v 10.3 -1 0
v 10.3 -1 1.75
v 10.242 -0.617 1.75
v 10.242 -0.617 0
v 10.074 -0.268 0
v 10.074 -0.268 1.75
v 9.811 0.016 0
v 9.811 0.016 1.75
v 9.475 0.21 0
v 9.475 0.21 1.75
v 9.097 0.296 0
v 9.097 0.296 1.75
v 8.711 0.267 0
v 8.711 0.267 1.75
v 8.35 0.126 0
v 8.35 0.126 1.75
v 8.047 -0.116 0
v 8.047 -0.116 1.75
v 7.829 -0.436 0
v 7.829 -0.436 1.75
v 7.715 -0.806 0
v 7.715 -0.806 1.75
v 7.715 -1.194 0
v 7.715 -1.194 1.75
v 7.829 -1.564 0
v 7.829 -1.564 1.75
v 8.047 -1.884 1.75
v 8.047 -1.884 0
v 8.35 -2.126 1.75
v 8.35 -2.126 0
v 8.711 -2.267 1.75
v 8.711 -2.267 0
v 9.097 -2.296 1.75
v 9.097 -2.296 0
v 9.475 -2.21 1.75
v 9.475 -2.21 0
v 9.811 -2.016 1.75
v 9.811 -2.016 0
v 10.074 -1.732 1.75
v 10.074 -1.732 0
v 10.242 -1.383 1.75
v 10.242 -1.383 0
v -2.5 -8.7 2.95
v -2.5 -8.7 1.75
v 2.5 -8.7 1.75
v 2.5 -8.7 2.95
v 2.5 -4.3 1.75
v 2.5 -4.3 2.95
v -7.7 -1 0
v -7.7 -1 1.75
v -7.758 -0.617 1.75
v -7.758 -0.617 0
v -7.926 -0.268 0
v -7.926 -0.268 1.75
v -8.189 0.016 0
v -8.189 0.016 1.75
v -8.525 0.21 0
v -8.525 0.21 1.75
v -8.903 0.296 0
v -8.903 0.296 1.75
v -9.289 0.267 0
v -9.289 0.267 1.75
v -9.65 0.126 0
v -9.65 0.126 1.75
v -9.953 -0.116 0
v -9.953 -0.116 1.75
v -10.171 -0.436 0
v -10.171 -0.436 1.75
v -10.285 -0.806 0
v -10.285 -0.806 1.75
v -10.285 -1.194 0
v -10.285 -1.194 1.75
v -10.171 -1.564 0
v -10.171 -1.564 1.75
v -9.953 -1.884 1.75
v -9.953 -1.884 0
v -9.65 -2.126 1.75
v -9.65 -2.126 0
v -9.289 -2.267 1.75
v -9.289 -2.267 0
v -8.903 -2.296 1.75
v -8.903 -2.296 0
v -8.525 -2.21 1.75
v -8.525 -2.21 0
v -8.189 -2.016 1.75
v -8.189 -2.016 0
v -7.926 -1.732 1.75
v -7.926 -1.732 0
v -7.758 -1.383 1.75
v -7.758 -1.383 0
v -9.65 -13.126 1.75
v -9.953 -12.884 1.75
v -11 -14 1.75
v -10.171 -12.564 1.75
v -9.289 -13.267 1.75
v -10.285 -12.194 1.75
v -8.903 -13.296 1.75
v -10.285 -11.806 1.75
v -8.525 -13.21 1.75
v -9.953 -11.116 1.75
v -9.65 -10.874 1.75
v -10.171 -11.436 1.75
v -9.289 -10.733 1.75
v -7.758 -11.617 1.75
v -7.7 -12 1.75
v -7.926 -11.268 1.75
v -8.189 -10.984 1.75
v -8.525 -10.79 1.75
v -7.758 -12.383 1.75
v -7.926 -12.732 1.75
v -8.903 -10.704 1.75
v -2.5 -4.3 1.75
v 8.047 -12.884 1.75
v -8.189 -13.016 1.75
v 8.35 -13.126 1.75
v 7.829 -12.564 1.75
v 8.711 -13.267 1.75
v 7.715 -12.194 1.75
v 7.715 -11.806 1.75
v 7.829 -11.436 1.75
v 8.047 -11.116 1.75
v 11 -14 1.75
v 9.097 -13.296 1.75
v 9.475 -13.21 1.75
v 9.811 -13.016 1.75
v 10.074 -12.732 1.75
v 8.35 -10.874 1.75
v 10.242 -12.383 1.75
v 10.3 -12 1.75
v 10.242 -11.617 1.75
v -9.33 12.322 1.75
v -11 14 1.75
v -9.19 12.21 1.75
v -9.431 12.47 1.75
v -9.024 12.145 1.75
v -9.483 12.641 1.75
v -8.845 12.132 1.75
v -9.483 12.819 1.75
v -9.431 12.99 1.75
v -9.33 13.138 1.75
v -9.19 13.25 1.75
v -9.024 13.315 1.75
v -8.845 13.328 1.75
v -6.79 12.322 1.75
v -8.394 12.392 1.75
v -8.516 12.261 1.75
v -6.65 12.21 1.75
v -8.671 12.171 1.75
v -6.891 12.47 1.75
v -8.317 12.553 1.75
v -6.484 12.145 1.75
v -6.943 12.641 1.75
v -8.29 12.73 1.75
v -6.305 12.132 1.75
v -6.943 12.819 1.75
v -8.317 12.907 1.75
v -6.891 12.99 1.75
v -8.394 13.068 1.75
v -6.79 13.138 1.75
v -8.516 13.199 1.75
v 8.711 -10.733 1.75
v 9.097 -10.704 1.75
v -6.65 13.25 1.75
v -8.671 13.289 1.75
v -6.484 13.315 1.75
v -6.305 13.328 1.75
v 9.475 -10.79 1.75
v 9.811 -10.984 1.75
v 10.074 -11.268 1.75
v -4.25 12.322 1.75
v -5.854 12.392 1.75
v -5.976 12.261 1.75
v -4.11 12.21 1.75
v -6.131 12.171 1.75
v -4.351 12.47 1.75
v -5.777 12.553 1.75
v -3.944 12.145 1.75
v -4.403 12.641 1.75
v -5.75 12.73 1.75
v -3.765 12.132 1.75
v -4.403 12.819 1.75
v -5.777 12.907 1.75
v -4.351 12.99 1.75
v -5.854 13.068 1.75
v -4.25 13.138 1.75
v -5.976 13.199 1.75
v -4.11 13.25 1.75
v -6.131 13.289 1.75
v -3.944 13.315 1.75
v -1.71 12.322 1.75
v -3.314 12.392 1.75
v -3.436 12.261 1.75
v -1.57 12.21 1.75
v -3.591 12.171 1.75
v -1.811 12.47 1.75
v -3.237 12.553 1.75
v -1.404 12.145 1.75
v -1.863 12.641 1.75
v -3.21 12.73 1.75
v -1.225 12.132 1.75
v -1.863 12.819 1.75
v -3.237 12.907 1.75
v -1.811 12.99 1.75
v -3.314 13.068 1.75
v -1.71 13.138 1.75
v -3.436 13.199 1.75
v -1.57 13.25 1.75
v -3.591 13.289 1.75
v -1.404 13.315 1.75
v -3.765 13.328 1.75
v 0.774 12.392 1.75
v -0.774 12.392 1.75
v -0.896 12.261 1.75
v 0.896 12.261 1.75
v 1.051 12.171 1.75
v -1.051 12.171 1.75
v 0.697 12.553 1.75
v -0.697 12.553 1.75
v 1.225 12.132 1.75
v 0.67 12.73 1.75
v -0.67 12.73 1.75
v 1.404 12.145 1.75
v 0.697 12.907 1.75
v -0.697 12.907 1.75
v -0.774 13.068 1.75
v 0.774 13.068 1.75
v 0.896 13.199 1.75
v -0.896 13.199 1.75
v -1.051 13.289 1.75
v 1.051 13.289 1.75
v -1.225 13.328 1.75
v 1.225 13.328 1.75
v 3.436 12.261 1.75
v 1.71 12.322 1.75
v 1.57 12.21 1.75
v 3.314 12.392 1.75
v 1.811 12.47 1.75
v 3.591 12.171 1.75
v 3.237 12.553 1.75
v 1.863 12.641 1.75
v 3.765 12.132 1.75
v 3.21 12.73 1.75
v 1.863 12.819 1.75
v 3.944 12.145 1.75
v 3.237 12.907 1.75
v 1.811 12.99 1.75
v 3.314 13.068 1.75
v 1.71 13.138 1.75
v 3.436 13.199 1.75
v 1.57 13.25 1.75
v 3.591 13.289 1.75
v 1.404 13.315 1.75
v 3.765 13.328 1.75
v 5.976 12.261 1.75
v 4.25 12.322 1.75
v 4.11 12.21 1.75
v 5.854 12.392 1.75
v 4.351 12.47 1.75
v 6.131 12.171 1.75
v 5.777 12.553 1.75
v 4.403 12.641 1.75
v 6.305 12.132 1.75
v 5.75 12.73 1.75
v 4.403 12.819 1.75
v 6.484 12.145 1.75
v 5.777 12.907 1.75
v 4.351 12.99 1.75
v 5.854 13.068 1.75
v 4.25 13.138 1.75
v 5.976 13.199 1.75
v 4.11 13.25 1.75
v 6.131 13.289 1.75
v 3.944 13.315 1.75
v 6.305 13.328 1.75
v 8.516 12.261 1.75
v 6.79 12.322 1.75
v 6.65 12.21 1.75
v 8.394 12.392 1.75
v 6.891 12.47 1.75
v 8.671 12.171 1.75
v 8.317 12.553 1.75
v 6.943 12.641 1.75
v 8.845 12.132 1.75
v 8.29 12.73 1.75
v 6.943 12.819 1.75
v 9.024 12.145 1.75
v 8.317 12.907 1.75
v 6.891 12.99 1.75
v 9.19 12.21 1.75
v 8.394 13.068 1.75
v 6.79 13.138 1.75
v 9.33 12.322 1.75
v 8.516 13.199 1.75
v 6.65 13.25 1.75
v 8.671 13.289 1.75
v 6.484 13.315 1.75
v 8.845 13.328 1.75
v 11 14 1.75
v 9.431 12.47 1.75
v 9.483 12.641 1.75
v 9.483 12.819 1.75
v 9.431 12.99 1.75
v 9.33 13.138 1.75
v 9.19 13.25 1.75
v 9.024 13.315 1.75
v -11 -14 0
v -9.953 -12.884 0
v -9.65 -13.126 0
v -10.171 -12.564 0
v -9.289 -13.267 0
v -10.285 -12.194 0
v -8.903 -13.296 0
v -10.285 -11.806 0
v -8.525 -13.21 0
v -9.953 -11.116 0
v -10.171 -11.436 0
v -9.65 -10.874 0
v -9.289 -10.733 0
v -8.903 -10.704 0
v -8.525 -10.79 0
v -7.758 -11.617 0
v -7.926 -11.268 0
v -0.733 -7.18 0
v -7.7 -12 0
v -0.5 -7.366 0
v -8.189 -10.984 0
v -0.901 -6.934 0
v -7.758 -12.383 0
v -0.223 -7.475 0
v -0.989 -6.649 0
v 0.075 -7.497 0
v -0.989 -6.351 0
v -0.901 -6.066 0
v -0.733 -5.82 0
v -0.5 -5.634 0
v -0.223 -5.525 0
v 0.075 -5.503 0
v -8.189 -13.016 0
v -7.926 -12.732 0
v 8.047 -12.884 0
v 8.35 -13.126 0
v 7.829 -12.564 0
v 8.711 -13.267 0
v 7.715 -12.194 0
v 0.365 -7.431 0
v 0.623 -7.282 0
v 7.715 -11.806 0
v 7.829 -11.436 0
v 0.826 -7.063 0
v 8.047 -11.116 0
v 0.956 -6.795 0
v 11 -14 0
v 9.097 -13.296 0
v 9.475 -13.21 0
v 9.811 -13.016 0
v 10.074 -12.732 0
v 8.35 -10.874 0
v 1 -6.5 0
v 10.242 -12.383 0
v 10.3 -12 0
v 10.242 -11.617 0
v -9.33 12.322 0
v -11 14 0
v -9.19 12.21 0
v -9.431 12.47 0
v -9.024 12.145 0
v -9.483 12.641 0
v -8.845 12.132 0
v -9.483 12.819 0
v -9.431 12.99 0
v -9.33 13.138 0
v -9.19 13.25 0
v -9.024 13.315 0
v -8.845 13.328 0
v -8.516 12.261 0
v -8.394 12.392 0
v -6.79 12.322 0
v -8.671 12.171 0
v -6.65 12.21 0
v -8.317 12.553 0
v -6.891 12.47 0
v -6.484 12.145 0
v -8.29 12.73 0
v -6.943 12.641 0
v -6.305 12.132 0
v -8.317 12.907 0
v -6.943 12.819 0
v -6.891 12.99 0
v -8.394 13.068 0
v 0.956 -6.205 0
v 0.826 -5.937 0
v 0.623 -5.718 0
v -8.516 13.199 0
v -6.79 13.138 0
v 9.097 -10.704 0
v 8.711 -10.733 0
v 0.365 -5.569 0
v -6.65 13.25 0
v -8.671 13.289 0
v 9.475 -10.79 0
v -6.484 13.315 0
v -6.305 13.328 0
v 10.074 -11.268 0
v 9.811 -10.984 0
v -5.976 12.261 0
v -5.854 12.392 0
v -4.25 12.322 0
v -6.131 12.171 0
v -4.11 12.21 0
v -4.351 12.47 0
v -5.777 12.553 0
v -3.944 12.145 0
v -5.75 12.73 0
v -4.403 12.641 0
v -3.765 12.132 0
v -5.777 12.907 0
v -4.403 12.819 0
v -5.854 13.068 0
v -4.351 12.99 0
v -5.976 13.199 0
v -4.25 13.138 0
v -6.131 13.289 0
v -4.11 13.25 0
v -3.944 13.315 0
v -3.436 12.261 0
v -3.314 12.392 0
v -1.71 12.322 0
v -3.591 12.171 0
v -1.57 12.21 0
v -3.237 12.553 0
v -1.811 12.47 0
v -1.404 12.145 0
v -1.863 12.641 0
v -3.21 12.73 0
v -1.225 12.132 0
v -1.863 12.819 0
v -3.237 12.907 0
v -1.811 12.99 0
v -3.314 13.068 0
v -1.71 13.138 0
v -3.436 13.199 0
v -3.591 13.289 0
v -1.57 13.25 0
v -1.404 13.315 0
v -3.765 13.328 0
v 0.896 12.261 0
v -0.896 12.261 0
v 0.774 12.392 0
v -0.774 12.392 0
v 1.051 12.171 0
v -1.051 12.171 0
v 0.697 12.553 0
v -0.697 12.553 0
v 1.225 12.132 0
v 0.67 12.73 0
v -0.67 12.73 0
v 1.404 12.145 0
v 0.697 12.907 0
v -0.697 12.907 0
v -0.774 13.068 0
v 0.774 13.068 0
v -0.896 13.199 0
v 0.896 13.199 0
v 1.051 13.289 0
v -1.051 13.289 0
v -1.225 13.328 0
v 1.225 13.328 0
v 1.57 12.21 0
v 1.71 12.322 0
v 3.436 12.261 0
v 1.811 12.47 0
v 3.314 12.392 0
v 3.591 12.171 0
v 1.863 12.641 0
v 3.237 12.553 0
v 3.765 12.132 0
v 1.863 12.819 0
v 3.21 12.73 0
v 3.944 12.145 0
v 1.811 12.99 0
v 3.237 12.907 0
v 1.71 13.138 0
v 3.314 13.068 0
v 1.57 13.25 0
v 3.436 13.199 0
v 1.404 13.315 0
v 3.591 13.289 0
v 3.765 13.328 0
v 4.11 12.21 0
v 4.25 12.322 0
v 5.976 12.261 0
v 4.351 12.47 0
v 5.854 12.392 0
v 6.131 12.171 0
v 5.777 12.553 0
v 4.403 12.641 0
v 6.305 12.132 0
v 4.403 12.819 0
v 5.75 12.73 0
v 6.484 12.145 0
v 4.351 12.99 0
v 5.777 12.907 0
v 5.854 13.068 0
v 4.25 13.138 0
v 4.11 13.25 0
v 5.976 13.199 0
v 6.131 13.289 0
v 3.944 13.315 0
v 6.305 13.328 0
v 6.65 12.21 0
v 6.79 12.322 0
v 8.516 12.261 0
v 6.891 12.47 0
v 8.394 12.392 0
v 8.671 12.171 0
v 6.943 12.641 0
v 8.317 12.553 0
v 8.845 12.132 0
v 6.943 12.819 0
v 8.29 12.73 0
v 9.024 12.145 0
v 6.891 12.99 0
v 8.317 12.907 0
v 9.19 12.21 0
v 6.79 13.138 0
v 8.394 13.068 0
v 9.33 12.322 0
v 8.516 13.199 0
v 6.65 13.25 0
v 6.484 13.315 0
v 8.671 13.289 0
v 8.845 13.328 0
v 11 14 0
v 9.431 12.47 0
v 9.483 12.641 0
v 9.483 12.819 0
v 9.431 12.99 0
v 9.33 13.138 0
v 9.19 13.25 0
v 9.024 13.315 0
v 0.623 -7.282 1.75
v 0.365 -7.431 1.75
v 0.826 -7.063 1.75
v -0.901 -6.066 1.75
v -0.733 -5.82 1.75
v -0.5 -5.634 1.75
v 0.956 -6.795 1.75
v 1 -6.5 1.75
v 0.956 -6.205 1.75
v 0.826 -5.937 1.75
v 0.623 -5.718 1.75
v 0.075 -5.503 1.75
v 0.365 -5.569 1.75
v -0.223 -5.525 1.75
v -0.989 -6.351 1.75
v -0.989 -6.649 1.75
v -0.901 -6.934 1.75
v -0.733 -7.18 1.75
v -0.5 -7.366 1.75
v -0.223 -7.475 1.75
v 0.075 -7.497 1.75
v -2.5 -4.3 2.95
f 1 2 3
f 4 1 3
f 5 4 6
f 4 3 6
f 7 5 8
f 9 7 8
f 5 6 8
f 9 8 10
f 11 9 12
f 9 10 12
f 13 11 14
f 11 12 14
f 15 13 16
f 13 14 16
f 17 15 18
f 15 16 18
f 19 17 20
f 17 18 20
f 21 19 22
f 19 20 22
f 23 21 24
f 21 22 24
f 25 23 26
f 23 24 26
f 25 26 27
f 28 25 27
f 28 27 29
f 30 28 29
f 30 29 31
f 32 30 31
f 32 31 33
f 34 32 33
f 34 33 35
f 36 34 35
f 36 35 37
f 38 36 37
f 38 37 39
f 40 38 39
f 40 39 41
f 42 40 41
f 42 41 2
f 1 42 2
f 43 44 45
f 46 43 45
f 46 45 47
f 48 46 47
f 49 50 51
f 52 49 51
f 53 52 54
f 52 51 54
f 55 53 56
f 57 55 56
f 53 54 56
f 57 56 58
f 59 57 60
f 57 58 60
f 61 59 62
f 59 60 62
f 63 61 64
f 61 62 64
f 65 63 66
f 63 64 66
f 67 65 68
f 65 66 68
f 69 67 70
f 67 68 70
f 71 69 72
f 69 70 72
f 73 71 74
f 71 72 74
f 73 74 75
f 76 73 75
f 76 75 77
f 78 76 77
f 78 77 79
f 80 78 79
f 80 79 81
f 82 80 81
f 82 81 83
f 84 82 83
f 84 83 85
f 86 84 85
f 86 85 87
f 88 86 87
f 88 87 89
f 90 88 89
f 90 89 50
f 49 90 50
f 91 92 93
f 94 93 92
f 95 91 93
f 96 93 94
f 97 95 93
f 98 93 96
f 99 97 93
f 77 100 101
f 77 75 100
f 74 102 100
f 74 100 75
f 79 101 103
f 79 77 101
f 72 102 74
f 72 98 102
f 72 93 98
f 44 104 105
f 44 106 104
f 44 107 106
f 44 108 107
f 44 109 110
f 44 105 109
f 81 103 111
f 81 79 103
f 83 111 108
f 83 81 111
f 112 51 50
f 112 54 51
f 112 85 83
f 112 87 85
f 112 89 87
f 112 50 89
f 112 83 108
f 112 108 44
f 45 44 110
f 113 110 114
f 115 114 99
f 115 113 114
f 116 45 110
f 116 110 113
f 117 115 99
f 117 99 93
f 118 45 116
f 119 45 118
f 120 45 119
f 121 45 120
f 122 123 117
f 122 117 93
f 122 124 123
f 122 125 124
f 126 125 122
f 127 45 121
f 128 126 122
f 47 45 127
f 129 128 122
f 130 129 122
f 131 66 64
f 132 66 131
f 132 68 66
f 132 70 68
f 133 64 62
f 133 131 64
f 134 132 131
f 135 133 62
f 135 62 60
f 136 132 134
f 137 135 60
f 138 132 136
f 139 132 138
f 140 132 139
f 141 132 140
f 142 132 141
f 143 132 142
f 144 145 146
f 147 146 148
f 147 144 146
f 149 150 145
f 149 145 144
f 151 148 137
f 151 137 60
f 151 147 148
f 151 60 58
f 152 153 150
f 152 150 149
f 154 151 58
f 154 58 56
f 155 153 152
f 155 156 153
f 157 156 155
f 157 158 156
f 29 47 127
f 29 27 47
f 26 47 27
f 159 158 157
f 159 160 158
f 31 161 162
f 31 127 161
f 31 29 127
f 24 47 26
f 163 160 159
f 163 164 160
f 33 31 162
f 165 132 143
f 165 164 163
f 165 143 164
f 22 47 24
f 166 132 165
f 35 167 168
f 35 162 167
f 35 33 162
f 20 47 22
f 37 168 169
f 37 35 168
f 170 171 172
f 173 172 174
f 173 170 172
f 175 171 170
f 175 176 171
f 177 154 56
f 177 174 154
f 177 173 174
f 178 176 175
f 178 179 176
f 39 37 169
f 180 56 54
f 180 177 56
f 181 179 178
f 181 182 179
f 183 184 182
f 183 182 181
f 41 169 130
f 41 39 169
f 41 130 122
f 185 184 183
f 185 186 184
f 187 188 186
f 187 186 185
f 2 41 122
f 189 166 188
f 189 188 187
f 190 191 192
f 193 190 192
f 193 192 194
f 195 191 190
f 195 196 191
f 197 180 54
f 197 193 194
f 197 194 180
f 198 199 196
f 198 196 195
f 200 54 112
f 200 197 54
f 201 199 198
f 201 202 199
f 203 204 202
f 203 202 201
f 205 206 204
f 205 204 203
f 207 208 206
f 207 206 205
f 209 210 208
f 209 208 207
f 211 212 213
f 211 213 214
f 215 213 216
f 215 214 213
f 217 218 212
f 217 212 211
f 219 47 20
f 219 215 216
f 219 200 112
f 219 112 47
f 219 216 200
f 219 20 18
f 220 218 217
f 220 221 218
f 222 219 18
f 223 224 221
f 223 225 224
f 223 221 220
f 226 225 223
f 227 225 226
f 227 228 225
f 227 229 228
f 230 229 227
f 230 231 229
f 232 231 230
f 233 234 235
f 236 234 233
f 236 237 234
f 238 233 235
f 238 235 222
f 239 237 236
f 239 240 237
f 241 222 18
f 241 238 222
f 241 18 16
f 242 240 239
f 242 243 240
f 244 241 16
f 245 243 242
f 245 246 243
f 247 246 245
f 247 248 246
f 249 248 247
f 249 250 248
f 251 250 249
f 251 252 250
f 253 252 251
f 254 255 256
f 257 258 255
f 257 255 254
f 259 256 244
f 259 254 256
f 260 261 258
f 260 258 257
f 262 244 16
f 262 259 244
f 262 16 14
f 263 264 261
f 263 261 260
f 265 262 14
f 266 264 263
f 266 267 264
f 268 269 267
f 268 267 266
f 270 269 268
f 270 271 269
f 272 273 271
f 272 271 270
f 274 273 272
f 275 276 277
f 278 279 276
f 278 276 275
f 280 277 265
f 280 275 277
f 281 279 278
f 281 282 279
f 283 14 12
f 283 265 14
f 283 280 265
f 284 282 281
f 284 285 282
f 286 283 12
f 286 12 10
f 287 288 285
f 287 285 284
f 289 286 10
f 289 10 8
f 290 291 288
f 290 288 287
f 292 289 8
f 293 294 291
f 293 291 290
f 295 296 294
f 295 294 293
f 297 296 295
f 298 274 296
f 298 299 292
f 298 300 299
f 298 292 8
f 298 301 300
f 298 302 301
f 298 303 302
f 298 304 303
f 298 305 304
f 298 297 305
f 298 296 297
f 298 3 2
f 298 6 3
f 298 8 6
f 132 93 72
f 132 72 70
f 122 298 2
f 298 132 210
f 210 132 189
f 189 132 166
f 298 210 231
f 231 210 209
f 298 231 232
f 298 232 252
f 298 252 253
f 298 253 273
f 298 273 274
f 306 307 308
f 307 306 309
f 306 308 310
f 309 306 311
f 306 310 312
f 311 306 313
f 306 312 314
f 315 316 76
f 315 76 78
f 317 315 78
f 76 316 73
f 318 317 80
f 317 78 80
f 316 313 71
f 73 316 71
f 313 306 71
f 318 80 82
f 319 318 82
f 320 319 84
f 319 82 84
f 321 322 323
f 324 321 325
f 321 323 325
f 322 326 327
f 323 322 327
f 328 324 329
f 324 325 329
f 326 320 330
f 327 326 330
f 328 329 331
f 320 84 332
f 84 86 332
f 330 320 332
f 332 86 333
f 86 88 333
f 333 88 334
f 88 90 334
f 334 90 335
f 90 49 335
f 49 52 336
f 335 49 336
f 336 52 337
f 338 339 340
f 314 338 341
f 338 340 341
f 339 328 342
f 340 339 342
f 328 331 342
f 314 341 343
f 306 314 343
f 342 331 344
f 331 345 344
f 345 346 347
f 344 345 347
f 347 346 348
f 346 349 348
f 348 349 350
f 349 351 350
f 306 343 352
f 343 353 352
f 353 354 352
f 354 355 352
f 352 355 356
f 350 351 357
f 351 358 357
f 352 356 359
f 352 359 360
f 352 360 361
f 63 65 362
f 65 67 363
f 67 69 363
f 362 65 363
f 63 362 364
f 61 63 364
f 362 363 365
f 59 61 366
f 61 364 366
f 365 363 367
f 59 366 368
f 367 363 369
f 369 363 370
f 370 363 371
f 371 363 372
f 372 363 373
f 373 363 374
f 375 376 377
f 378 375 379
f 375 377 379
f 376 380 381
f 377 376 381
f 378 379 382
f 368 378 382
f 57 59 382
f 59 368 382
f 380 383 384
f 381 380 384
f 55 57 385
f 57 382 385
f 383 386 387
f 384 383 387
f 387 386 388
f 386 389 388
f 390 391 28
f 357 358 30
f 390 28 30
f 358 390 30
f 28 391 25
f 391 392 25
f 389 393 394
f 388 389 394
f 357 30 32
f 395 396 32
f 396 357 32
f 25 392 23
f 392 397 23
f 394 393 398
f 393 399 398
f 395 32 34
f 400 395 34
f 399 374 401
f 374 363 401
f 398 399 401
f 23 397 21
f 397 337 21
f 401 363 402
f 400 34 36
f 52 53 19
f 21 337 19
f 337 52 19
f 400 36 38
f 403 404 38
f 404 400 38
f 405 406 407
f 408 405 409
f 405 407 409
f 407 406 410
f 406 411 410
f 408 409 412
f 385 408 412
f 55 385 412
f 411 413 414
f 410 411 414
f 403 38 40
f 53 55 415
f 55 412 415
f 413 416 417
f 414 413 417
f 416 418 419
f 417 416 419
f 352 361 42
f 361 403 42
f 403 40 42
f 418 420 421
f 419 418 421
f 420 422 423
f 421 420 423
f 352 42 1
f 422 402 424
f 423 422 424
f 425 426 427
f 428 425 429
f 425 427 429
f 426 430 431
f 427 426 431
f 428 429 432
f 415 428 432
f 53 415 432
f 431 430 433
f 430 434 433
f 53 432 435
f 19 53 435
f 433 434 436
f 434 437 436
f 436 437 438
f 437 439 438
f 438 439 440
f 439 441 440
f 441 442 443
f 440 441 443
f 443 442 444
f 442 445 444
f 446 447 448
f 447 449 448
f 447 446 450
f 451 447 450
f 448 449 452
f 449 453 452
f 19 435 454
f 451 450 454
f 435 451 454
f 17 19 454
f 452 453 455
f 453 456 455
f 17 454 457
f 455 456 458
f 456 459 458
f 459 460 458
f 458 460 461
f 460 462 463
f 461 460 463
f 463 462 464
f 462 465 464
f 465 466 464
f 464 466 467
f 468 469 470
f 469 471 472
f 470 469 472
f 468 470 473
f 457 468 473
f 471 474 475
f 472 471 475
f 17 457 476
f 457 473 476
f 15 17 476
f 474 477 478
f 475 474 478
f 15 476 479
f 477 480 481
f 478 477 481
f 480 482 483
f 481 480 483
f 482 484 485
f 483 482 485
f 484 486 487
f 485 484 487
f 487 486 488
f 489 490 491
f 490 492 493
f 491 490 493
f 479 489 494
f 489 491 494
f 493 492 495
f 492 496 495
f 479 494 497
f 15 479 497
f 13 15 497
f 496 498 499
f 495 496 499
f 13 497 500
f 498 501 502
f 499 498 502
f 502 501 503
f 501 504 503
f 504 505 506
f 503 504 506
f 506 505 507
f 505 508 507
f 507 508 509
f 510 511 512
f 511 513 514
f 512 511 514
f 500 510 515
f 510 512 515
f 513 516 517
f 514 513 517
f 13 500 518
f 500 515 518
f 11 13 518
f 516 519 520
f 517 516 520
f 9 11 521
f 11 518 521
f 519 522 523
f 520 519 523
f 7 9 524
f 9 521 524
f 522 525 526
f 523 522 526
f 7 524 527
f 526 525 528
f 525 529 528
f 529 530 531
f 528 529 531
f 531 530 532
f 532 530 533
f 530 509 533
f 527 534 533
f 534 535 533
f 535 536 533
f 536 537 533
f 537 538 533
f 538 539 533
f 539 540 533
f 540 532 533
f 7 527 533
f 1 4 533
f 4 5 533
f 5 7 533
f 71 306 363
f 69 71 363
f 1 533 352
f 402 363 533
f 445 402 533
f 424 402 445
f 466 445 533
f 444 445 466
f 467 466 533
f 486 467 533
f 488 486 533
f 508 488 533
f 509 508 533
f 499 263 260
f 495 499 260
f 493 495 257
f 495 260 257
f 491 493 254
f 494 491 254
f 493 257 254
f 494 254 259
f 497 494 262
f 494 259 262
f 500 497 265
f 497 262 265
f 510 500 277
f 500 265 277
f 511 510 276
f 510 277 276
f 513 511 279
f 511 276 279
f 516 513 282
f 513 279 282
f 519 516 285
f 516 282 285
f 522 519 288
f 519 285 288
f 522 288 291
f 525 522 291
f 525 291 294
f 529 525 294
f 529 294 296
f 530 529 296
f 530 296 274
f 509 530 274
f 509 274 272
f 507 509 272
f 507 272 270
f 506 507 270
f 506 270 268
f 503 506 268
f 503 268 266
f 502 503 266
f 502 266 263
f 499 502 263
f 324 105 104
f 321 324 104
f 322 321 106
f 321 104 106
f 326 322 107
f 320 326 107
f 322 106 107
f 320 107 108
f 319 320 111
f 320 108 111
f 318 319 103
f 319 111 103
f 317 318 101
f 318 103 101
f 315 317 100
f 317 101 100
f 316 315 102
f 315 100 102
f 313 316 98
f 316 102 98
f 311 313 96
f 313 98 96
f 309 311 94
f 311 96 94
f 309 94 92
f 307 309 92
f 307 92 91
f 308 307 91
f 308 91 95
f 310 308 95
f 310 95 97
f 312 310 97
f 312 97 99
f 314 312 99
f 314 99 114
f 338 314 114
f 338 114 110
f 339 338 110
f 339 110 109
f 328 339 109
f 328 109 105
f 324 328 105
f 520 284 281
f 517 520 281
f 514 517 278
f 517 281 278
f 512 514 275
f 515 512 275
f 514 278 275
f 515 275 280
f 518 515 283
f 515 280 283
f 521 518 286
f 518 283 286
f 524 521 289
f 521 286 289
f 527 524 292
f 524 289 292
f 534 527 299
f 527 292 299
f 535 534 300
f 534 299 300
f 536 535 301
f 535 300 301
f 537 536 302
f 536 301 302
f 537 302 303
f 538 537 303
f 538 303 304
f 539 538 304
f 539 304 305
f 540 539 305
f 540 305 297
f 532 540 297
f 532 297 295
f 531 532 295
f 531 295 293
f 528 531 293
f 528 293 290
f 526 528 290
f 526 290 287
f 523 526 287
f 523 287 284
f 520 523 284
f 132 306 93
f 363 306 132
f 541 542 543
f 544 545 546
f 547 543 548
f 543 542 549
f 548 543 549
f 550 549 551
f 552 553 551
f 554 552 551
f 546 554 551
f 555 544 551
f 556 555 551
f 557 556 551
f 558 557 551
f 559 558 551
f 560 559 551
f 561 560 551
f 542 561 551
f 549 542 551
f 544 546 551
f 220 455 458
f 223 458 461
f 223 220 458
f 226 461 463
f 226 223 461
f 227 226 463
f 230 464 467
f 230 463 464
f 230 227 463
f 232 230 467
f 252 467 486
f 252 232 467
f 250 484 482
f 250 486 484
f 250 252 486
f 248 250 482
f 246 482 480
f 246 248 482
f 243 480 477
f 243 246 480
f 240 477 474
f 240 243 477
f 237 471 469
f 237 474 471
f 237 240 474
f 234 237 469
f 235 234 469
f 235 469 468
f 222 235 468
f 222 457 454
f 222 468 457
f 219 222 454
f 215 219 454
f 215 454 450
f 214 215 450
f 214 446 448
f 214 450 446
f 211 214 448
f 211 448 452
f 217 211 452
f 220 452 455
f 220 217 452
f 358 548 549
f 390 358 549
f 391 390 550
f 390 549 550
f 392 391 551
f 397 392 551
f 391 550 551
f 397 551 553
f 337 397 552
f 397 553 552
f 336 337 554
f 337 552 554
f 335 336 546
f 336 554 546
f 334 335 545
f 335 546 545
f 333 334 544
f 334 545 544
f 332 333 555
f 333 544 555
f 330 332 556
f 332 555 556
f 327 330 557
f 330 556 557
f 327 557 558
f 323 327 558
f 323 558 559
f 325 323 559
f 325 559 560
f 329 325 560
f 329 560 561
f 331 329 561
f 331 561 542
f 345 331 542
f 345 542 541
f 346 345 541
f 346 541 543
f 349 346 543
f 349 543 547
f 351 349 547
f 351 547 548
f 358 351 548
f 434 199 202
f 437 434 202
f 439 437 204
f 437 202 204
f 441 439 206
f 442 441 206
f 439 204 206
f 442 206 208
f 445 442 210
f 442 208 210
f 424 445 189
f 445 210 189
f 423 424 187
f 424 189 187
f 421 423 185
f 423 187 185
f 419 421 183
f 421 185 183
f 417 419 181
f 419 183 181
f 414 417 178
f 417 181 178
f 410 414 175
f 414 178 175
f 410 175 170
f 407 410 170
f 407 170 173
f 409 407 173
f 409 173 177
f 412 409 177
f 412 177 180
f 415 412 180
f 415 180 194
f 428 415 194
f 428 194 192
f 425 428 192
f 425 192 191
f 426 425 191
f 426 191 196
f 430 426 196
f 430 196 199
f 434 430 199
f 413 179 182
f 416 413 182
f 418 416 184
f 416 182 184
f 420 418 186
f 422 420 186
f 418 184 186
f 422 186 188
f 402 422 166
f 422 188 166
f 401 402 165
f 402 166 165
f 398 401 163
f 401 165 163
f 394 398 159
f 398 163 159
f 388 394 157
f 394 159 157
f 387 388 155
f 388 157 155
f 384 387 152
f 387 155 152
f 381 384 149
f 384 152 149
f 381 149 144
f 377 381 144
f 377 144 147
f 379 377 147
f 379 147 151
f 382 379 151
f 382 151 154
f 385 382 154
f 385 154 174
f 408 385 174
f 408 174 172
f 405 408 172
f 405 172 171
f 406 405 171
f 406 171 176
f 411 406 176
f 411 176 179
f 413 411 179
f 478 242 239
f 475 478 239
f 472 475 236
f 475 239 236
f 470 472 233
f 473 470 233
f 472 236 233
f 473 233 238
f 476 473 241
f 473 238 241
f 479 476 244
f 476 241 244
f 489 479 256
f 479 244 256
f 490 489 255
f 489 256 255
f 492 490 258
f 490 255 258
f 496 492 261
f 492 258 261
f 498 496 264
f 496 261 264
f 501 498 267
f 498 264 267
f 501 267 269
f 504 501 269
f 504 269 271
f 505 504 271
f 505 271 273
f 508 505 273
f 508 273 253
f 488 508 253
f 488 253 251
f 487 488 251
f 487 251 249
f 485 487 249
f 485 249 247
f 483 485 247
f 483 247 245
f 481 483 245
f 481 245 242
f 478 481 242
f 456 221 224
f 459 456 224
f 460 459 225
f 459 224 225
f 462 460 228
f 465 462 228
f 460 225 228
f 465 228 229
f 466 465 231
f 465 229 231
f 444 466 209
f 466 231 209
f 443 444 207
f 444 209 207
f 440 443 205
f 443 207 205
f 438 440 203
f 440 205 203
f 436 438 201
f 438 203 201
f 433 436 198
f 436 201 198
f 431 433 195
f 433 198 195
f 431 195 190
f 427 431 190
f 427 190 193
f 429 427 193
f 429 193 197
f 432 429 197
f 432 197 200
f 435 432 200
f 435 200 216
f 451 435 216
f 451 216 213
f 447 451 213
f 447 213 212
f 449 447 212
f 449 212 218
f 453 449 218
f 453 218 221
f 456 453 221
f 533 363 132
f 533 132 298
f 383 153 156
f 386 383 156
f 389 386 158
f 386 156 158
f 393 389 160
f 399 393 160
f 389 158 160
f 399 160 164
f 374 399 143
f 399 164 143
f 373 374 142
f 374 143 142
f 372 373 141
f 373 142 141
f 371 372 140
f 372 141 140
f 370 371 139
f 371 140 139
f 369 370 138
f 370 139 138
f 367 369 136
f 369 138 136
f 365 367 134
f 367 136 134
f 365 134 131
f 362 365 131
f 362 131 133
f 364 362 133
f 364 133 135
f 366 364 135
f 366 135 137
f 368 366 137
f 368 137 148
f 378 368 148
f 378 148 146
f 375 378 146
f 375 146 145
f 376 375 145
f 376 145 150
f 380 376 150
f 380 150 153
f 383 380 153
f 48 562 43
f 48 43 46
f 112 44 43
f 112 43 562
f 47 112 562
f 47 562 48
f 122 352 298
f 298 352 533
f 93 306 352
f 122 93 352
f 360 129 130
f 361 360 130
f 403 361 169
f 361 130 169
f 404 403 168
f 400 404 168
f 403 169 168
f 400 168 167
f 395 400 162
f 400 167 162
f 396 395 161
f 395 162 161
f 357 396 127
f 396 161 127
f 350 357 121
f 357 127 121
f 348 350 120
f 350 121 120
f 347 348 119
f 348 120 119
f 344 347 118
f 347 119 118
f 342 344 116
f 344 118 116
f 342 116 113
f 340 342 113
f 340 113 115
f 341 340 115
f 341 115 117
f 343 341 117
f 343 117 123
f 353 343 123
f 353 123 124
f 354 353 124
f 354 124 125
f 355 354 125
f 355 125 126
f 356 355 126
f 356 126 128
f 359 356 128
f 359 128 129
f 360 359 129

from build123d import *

# Parameters (mm, degrees)
SKETCH1_W               = 22
SKETCH1_H               = 28
BOSS_EXTRUDE1_DEPTH     = 1.75
SKETCH2_R               = 1.3
SKETCH2_R_2             = 1
CUT_EXTRUDE1_DEPTH      = 18.890290663
SKETCH3_R               = 0.6
CUT_EXTRUDE2_DEPTH      = 18.890290663
LPATTERN1_COUNT         = 4
LPATTERN1_PITCH         = 2.54
MIRROR1_COPY_1_SKETCH_R = 0.6
MIRROR1_COPY_1_DEPTH    = 18.890290663
MIRROR1_COPY_2_SKETCH_R = 0.6
MIRROR1_COPY_2_DEPTH    = 18.890290663
MIRROR1_COPY_3_SKETCH_R = 0.6
MIRROR1_COPY_3_DEPTH    = 18.890290663
SKETCH4_W               = 5
SKETCH4_H               = 4.4
BOSS_EXTRUDE2_DEPTH     = 1.2


with BuildPart() as part:
    # Sketch1 → Boss-Extrude1 (new body)
    with BuildSketch(Plane.XY):
        Rectangle(SKETCH1_W, SKETCH1_H)
    extrude(amount=BOSS_EXTRUDE1_DEPTH)

    # Sketch2 → Cut-Extrude1 (cut, through all)
    with BuildSketch(Plane.XY.offset(1.75)):
        with Locations((-9, -1)):
            Circle(SKETCH2_R)
        with Locations((-9, -12)):
            Circle(SKETCH2_R)
        with Locations((9, -12)):
            Circle(SKETCH2_R)
        with Locations((9, -1)):
            Circle(SKETCH2_R)
        with Locations((0, -6.5)):
            Circle(SKETCH2_R_2)
    extrude(amount=-CUT_EXTRUDE1_DEPTH, mode=Mode.SUBTRACT)

    # Sketch3 → Cut-Extrude2 (cut, through all)
    with BuildSketch(Plane.XY.offset(1.75)):
        with Locations((-1.27, 12.73)):
            Circle(SKETCH3_R)
    cut_extrude2 = extrude(amount=-CUT_EXTRUDE2_DEPTH, mode=Mode.SUBTRACT)

    # LPattern1: Cut-Extrude2 ×4
    with Locations(*[(-i * LPATTERN1_PITCH, 0, 0) for i in range(1, LPATTERN1_COUNT)]):
        add(cut_extrude2, mode=Mode.SUBTRACT)

    # Mirror1: Cut-Extrude2 across plane
    add(cut_extrude2.mirror(Plane(origin=(0, 0, 0), x_dir=(0, 0, 1), z_dir=(1, 0, 0))), mode=Mode.SUBTRACT)

    # Mirror1 copy 1 sketch → Mirror1 copy 1 (cut, through all)
    with BuildSketch(Plane(origin=(2.54, 0, 1.75), x_dir=(-1, 0, 0), z_dir=(0, 0, 1))):
        with Locations((-1.27, -12.73)):
            Circle(MIRROR1_COPY_1_SKETCH_R)
    extrude(amount=-MIRROR1_COPY_1_DEPTH, mode=Mode.SUBTRACT)

    # Mirror1 copy 2 sketch → Mirror1 copy 2 (cut, through all)
    with BuildSketch(Plane(origin=(5.08, 0, 1.75), x_dir=(-1, 0, 0), z_dir=(0, 0, 1))):
        with Locations((-1.27, -12.73)):
            Circle(MIRROR1_COPY_2_SKETCH_R)
    extrude(amount=-MIRROR1_COPY_2_DEPTH, mode=Mode.SUBTRACT)

    # Mirror1 copy 3 sketch → Mirror1 copy 3 (cut, through all)
    with BuildSketch(Plane(origin=(7.62, 0, 1.75), x_dir=(-1, 0, 0), z_dir=(0, 0, 1))):
        with Locations((-1.27, -12.73)):
            Circle(MIRROR1_COPY_3_SKETCH_R)
    extrude(amount=-MIRROR1_COPY_3_DEPTH, mode=Mode.SUBTRACT)

    # Sketch4 → Boss-Extrude2 (add)
    with BuildSketch(Plane.XY.offset(1.75)):
        with Locations((0, -6.5)):
            Rectangle(SKETCH4_W, SKETCH4_H)
    extrude(amount=BOSS_EXTRUDE2_DEPTH)


solid = part.part
